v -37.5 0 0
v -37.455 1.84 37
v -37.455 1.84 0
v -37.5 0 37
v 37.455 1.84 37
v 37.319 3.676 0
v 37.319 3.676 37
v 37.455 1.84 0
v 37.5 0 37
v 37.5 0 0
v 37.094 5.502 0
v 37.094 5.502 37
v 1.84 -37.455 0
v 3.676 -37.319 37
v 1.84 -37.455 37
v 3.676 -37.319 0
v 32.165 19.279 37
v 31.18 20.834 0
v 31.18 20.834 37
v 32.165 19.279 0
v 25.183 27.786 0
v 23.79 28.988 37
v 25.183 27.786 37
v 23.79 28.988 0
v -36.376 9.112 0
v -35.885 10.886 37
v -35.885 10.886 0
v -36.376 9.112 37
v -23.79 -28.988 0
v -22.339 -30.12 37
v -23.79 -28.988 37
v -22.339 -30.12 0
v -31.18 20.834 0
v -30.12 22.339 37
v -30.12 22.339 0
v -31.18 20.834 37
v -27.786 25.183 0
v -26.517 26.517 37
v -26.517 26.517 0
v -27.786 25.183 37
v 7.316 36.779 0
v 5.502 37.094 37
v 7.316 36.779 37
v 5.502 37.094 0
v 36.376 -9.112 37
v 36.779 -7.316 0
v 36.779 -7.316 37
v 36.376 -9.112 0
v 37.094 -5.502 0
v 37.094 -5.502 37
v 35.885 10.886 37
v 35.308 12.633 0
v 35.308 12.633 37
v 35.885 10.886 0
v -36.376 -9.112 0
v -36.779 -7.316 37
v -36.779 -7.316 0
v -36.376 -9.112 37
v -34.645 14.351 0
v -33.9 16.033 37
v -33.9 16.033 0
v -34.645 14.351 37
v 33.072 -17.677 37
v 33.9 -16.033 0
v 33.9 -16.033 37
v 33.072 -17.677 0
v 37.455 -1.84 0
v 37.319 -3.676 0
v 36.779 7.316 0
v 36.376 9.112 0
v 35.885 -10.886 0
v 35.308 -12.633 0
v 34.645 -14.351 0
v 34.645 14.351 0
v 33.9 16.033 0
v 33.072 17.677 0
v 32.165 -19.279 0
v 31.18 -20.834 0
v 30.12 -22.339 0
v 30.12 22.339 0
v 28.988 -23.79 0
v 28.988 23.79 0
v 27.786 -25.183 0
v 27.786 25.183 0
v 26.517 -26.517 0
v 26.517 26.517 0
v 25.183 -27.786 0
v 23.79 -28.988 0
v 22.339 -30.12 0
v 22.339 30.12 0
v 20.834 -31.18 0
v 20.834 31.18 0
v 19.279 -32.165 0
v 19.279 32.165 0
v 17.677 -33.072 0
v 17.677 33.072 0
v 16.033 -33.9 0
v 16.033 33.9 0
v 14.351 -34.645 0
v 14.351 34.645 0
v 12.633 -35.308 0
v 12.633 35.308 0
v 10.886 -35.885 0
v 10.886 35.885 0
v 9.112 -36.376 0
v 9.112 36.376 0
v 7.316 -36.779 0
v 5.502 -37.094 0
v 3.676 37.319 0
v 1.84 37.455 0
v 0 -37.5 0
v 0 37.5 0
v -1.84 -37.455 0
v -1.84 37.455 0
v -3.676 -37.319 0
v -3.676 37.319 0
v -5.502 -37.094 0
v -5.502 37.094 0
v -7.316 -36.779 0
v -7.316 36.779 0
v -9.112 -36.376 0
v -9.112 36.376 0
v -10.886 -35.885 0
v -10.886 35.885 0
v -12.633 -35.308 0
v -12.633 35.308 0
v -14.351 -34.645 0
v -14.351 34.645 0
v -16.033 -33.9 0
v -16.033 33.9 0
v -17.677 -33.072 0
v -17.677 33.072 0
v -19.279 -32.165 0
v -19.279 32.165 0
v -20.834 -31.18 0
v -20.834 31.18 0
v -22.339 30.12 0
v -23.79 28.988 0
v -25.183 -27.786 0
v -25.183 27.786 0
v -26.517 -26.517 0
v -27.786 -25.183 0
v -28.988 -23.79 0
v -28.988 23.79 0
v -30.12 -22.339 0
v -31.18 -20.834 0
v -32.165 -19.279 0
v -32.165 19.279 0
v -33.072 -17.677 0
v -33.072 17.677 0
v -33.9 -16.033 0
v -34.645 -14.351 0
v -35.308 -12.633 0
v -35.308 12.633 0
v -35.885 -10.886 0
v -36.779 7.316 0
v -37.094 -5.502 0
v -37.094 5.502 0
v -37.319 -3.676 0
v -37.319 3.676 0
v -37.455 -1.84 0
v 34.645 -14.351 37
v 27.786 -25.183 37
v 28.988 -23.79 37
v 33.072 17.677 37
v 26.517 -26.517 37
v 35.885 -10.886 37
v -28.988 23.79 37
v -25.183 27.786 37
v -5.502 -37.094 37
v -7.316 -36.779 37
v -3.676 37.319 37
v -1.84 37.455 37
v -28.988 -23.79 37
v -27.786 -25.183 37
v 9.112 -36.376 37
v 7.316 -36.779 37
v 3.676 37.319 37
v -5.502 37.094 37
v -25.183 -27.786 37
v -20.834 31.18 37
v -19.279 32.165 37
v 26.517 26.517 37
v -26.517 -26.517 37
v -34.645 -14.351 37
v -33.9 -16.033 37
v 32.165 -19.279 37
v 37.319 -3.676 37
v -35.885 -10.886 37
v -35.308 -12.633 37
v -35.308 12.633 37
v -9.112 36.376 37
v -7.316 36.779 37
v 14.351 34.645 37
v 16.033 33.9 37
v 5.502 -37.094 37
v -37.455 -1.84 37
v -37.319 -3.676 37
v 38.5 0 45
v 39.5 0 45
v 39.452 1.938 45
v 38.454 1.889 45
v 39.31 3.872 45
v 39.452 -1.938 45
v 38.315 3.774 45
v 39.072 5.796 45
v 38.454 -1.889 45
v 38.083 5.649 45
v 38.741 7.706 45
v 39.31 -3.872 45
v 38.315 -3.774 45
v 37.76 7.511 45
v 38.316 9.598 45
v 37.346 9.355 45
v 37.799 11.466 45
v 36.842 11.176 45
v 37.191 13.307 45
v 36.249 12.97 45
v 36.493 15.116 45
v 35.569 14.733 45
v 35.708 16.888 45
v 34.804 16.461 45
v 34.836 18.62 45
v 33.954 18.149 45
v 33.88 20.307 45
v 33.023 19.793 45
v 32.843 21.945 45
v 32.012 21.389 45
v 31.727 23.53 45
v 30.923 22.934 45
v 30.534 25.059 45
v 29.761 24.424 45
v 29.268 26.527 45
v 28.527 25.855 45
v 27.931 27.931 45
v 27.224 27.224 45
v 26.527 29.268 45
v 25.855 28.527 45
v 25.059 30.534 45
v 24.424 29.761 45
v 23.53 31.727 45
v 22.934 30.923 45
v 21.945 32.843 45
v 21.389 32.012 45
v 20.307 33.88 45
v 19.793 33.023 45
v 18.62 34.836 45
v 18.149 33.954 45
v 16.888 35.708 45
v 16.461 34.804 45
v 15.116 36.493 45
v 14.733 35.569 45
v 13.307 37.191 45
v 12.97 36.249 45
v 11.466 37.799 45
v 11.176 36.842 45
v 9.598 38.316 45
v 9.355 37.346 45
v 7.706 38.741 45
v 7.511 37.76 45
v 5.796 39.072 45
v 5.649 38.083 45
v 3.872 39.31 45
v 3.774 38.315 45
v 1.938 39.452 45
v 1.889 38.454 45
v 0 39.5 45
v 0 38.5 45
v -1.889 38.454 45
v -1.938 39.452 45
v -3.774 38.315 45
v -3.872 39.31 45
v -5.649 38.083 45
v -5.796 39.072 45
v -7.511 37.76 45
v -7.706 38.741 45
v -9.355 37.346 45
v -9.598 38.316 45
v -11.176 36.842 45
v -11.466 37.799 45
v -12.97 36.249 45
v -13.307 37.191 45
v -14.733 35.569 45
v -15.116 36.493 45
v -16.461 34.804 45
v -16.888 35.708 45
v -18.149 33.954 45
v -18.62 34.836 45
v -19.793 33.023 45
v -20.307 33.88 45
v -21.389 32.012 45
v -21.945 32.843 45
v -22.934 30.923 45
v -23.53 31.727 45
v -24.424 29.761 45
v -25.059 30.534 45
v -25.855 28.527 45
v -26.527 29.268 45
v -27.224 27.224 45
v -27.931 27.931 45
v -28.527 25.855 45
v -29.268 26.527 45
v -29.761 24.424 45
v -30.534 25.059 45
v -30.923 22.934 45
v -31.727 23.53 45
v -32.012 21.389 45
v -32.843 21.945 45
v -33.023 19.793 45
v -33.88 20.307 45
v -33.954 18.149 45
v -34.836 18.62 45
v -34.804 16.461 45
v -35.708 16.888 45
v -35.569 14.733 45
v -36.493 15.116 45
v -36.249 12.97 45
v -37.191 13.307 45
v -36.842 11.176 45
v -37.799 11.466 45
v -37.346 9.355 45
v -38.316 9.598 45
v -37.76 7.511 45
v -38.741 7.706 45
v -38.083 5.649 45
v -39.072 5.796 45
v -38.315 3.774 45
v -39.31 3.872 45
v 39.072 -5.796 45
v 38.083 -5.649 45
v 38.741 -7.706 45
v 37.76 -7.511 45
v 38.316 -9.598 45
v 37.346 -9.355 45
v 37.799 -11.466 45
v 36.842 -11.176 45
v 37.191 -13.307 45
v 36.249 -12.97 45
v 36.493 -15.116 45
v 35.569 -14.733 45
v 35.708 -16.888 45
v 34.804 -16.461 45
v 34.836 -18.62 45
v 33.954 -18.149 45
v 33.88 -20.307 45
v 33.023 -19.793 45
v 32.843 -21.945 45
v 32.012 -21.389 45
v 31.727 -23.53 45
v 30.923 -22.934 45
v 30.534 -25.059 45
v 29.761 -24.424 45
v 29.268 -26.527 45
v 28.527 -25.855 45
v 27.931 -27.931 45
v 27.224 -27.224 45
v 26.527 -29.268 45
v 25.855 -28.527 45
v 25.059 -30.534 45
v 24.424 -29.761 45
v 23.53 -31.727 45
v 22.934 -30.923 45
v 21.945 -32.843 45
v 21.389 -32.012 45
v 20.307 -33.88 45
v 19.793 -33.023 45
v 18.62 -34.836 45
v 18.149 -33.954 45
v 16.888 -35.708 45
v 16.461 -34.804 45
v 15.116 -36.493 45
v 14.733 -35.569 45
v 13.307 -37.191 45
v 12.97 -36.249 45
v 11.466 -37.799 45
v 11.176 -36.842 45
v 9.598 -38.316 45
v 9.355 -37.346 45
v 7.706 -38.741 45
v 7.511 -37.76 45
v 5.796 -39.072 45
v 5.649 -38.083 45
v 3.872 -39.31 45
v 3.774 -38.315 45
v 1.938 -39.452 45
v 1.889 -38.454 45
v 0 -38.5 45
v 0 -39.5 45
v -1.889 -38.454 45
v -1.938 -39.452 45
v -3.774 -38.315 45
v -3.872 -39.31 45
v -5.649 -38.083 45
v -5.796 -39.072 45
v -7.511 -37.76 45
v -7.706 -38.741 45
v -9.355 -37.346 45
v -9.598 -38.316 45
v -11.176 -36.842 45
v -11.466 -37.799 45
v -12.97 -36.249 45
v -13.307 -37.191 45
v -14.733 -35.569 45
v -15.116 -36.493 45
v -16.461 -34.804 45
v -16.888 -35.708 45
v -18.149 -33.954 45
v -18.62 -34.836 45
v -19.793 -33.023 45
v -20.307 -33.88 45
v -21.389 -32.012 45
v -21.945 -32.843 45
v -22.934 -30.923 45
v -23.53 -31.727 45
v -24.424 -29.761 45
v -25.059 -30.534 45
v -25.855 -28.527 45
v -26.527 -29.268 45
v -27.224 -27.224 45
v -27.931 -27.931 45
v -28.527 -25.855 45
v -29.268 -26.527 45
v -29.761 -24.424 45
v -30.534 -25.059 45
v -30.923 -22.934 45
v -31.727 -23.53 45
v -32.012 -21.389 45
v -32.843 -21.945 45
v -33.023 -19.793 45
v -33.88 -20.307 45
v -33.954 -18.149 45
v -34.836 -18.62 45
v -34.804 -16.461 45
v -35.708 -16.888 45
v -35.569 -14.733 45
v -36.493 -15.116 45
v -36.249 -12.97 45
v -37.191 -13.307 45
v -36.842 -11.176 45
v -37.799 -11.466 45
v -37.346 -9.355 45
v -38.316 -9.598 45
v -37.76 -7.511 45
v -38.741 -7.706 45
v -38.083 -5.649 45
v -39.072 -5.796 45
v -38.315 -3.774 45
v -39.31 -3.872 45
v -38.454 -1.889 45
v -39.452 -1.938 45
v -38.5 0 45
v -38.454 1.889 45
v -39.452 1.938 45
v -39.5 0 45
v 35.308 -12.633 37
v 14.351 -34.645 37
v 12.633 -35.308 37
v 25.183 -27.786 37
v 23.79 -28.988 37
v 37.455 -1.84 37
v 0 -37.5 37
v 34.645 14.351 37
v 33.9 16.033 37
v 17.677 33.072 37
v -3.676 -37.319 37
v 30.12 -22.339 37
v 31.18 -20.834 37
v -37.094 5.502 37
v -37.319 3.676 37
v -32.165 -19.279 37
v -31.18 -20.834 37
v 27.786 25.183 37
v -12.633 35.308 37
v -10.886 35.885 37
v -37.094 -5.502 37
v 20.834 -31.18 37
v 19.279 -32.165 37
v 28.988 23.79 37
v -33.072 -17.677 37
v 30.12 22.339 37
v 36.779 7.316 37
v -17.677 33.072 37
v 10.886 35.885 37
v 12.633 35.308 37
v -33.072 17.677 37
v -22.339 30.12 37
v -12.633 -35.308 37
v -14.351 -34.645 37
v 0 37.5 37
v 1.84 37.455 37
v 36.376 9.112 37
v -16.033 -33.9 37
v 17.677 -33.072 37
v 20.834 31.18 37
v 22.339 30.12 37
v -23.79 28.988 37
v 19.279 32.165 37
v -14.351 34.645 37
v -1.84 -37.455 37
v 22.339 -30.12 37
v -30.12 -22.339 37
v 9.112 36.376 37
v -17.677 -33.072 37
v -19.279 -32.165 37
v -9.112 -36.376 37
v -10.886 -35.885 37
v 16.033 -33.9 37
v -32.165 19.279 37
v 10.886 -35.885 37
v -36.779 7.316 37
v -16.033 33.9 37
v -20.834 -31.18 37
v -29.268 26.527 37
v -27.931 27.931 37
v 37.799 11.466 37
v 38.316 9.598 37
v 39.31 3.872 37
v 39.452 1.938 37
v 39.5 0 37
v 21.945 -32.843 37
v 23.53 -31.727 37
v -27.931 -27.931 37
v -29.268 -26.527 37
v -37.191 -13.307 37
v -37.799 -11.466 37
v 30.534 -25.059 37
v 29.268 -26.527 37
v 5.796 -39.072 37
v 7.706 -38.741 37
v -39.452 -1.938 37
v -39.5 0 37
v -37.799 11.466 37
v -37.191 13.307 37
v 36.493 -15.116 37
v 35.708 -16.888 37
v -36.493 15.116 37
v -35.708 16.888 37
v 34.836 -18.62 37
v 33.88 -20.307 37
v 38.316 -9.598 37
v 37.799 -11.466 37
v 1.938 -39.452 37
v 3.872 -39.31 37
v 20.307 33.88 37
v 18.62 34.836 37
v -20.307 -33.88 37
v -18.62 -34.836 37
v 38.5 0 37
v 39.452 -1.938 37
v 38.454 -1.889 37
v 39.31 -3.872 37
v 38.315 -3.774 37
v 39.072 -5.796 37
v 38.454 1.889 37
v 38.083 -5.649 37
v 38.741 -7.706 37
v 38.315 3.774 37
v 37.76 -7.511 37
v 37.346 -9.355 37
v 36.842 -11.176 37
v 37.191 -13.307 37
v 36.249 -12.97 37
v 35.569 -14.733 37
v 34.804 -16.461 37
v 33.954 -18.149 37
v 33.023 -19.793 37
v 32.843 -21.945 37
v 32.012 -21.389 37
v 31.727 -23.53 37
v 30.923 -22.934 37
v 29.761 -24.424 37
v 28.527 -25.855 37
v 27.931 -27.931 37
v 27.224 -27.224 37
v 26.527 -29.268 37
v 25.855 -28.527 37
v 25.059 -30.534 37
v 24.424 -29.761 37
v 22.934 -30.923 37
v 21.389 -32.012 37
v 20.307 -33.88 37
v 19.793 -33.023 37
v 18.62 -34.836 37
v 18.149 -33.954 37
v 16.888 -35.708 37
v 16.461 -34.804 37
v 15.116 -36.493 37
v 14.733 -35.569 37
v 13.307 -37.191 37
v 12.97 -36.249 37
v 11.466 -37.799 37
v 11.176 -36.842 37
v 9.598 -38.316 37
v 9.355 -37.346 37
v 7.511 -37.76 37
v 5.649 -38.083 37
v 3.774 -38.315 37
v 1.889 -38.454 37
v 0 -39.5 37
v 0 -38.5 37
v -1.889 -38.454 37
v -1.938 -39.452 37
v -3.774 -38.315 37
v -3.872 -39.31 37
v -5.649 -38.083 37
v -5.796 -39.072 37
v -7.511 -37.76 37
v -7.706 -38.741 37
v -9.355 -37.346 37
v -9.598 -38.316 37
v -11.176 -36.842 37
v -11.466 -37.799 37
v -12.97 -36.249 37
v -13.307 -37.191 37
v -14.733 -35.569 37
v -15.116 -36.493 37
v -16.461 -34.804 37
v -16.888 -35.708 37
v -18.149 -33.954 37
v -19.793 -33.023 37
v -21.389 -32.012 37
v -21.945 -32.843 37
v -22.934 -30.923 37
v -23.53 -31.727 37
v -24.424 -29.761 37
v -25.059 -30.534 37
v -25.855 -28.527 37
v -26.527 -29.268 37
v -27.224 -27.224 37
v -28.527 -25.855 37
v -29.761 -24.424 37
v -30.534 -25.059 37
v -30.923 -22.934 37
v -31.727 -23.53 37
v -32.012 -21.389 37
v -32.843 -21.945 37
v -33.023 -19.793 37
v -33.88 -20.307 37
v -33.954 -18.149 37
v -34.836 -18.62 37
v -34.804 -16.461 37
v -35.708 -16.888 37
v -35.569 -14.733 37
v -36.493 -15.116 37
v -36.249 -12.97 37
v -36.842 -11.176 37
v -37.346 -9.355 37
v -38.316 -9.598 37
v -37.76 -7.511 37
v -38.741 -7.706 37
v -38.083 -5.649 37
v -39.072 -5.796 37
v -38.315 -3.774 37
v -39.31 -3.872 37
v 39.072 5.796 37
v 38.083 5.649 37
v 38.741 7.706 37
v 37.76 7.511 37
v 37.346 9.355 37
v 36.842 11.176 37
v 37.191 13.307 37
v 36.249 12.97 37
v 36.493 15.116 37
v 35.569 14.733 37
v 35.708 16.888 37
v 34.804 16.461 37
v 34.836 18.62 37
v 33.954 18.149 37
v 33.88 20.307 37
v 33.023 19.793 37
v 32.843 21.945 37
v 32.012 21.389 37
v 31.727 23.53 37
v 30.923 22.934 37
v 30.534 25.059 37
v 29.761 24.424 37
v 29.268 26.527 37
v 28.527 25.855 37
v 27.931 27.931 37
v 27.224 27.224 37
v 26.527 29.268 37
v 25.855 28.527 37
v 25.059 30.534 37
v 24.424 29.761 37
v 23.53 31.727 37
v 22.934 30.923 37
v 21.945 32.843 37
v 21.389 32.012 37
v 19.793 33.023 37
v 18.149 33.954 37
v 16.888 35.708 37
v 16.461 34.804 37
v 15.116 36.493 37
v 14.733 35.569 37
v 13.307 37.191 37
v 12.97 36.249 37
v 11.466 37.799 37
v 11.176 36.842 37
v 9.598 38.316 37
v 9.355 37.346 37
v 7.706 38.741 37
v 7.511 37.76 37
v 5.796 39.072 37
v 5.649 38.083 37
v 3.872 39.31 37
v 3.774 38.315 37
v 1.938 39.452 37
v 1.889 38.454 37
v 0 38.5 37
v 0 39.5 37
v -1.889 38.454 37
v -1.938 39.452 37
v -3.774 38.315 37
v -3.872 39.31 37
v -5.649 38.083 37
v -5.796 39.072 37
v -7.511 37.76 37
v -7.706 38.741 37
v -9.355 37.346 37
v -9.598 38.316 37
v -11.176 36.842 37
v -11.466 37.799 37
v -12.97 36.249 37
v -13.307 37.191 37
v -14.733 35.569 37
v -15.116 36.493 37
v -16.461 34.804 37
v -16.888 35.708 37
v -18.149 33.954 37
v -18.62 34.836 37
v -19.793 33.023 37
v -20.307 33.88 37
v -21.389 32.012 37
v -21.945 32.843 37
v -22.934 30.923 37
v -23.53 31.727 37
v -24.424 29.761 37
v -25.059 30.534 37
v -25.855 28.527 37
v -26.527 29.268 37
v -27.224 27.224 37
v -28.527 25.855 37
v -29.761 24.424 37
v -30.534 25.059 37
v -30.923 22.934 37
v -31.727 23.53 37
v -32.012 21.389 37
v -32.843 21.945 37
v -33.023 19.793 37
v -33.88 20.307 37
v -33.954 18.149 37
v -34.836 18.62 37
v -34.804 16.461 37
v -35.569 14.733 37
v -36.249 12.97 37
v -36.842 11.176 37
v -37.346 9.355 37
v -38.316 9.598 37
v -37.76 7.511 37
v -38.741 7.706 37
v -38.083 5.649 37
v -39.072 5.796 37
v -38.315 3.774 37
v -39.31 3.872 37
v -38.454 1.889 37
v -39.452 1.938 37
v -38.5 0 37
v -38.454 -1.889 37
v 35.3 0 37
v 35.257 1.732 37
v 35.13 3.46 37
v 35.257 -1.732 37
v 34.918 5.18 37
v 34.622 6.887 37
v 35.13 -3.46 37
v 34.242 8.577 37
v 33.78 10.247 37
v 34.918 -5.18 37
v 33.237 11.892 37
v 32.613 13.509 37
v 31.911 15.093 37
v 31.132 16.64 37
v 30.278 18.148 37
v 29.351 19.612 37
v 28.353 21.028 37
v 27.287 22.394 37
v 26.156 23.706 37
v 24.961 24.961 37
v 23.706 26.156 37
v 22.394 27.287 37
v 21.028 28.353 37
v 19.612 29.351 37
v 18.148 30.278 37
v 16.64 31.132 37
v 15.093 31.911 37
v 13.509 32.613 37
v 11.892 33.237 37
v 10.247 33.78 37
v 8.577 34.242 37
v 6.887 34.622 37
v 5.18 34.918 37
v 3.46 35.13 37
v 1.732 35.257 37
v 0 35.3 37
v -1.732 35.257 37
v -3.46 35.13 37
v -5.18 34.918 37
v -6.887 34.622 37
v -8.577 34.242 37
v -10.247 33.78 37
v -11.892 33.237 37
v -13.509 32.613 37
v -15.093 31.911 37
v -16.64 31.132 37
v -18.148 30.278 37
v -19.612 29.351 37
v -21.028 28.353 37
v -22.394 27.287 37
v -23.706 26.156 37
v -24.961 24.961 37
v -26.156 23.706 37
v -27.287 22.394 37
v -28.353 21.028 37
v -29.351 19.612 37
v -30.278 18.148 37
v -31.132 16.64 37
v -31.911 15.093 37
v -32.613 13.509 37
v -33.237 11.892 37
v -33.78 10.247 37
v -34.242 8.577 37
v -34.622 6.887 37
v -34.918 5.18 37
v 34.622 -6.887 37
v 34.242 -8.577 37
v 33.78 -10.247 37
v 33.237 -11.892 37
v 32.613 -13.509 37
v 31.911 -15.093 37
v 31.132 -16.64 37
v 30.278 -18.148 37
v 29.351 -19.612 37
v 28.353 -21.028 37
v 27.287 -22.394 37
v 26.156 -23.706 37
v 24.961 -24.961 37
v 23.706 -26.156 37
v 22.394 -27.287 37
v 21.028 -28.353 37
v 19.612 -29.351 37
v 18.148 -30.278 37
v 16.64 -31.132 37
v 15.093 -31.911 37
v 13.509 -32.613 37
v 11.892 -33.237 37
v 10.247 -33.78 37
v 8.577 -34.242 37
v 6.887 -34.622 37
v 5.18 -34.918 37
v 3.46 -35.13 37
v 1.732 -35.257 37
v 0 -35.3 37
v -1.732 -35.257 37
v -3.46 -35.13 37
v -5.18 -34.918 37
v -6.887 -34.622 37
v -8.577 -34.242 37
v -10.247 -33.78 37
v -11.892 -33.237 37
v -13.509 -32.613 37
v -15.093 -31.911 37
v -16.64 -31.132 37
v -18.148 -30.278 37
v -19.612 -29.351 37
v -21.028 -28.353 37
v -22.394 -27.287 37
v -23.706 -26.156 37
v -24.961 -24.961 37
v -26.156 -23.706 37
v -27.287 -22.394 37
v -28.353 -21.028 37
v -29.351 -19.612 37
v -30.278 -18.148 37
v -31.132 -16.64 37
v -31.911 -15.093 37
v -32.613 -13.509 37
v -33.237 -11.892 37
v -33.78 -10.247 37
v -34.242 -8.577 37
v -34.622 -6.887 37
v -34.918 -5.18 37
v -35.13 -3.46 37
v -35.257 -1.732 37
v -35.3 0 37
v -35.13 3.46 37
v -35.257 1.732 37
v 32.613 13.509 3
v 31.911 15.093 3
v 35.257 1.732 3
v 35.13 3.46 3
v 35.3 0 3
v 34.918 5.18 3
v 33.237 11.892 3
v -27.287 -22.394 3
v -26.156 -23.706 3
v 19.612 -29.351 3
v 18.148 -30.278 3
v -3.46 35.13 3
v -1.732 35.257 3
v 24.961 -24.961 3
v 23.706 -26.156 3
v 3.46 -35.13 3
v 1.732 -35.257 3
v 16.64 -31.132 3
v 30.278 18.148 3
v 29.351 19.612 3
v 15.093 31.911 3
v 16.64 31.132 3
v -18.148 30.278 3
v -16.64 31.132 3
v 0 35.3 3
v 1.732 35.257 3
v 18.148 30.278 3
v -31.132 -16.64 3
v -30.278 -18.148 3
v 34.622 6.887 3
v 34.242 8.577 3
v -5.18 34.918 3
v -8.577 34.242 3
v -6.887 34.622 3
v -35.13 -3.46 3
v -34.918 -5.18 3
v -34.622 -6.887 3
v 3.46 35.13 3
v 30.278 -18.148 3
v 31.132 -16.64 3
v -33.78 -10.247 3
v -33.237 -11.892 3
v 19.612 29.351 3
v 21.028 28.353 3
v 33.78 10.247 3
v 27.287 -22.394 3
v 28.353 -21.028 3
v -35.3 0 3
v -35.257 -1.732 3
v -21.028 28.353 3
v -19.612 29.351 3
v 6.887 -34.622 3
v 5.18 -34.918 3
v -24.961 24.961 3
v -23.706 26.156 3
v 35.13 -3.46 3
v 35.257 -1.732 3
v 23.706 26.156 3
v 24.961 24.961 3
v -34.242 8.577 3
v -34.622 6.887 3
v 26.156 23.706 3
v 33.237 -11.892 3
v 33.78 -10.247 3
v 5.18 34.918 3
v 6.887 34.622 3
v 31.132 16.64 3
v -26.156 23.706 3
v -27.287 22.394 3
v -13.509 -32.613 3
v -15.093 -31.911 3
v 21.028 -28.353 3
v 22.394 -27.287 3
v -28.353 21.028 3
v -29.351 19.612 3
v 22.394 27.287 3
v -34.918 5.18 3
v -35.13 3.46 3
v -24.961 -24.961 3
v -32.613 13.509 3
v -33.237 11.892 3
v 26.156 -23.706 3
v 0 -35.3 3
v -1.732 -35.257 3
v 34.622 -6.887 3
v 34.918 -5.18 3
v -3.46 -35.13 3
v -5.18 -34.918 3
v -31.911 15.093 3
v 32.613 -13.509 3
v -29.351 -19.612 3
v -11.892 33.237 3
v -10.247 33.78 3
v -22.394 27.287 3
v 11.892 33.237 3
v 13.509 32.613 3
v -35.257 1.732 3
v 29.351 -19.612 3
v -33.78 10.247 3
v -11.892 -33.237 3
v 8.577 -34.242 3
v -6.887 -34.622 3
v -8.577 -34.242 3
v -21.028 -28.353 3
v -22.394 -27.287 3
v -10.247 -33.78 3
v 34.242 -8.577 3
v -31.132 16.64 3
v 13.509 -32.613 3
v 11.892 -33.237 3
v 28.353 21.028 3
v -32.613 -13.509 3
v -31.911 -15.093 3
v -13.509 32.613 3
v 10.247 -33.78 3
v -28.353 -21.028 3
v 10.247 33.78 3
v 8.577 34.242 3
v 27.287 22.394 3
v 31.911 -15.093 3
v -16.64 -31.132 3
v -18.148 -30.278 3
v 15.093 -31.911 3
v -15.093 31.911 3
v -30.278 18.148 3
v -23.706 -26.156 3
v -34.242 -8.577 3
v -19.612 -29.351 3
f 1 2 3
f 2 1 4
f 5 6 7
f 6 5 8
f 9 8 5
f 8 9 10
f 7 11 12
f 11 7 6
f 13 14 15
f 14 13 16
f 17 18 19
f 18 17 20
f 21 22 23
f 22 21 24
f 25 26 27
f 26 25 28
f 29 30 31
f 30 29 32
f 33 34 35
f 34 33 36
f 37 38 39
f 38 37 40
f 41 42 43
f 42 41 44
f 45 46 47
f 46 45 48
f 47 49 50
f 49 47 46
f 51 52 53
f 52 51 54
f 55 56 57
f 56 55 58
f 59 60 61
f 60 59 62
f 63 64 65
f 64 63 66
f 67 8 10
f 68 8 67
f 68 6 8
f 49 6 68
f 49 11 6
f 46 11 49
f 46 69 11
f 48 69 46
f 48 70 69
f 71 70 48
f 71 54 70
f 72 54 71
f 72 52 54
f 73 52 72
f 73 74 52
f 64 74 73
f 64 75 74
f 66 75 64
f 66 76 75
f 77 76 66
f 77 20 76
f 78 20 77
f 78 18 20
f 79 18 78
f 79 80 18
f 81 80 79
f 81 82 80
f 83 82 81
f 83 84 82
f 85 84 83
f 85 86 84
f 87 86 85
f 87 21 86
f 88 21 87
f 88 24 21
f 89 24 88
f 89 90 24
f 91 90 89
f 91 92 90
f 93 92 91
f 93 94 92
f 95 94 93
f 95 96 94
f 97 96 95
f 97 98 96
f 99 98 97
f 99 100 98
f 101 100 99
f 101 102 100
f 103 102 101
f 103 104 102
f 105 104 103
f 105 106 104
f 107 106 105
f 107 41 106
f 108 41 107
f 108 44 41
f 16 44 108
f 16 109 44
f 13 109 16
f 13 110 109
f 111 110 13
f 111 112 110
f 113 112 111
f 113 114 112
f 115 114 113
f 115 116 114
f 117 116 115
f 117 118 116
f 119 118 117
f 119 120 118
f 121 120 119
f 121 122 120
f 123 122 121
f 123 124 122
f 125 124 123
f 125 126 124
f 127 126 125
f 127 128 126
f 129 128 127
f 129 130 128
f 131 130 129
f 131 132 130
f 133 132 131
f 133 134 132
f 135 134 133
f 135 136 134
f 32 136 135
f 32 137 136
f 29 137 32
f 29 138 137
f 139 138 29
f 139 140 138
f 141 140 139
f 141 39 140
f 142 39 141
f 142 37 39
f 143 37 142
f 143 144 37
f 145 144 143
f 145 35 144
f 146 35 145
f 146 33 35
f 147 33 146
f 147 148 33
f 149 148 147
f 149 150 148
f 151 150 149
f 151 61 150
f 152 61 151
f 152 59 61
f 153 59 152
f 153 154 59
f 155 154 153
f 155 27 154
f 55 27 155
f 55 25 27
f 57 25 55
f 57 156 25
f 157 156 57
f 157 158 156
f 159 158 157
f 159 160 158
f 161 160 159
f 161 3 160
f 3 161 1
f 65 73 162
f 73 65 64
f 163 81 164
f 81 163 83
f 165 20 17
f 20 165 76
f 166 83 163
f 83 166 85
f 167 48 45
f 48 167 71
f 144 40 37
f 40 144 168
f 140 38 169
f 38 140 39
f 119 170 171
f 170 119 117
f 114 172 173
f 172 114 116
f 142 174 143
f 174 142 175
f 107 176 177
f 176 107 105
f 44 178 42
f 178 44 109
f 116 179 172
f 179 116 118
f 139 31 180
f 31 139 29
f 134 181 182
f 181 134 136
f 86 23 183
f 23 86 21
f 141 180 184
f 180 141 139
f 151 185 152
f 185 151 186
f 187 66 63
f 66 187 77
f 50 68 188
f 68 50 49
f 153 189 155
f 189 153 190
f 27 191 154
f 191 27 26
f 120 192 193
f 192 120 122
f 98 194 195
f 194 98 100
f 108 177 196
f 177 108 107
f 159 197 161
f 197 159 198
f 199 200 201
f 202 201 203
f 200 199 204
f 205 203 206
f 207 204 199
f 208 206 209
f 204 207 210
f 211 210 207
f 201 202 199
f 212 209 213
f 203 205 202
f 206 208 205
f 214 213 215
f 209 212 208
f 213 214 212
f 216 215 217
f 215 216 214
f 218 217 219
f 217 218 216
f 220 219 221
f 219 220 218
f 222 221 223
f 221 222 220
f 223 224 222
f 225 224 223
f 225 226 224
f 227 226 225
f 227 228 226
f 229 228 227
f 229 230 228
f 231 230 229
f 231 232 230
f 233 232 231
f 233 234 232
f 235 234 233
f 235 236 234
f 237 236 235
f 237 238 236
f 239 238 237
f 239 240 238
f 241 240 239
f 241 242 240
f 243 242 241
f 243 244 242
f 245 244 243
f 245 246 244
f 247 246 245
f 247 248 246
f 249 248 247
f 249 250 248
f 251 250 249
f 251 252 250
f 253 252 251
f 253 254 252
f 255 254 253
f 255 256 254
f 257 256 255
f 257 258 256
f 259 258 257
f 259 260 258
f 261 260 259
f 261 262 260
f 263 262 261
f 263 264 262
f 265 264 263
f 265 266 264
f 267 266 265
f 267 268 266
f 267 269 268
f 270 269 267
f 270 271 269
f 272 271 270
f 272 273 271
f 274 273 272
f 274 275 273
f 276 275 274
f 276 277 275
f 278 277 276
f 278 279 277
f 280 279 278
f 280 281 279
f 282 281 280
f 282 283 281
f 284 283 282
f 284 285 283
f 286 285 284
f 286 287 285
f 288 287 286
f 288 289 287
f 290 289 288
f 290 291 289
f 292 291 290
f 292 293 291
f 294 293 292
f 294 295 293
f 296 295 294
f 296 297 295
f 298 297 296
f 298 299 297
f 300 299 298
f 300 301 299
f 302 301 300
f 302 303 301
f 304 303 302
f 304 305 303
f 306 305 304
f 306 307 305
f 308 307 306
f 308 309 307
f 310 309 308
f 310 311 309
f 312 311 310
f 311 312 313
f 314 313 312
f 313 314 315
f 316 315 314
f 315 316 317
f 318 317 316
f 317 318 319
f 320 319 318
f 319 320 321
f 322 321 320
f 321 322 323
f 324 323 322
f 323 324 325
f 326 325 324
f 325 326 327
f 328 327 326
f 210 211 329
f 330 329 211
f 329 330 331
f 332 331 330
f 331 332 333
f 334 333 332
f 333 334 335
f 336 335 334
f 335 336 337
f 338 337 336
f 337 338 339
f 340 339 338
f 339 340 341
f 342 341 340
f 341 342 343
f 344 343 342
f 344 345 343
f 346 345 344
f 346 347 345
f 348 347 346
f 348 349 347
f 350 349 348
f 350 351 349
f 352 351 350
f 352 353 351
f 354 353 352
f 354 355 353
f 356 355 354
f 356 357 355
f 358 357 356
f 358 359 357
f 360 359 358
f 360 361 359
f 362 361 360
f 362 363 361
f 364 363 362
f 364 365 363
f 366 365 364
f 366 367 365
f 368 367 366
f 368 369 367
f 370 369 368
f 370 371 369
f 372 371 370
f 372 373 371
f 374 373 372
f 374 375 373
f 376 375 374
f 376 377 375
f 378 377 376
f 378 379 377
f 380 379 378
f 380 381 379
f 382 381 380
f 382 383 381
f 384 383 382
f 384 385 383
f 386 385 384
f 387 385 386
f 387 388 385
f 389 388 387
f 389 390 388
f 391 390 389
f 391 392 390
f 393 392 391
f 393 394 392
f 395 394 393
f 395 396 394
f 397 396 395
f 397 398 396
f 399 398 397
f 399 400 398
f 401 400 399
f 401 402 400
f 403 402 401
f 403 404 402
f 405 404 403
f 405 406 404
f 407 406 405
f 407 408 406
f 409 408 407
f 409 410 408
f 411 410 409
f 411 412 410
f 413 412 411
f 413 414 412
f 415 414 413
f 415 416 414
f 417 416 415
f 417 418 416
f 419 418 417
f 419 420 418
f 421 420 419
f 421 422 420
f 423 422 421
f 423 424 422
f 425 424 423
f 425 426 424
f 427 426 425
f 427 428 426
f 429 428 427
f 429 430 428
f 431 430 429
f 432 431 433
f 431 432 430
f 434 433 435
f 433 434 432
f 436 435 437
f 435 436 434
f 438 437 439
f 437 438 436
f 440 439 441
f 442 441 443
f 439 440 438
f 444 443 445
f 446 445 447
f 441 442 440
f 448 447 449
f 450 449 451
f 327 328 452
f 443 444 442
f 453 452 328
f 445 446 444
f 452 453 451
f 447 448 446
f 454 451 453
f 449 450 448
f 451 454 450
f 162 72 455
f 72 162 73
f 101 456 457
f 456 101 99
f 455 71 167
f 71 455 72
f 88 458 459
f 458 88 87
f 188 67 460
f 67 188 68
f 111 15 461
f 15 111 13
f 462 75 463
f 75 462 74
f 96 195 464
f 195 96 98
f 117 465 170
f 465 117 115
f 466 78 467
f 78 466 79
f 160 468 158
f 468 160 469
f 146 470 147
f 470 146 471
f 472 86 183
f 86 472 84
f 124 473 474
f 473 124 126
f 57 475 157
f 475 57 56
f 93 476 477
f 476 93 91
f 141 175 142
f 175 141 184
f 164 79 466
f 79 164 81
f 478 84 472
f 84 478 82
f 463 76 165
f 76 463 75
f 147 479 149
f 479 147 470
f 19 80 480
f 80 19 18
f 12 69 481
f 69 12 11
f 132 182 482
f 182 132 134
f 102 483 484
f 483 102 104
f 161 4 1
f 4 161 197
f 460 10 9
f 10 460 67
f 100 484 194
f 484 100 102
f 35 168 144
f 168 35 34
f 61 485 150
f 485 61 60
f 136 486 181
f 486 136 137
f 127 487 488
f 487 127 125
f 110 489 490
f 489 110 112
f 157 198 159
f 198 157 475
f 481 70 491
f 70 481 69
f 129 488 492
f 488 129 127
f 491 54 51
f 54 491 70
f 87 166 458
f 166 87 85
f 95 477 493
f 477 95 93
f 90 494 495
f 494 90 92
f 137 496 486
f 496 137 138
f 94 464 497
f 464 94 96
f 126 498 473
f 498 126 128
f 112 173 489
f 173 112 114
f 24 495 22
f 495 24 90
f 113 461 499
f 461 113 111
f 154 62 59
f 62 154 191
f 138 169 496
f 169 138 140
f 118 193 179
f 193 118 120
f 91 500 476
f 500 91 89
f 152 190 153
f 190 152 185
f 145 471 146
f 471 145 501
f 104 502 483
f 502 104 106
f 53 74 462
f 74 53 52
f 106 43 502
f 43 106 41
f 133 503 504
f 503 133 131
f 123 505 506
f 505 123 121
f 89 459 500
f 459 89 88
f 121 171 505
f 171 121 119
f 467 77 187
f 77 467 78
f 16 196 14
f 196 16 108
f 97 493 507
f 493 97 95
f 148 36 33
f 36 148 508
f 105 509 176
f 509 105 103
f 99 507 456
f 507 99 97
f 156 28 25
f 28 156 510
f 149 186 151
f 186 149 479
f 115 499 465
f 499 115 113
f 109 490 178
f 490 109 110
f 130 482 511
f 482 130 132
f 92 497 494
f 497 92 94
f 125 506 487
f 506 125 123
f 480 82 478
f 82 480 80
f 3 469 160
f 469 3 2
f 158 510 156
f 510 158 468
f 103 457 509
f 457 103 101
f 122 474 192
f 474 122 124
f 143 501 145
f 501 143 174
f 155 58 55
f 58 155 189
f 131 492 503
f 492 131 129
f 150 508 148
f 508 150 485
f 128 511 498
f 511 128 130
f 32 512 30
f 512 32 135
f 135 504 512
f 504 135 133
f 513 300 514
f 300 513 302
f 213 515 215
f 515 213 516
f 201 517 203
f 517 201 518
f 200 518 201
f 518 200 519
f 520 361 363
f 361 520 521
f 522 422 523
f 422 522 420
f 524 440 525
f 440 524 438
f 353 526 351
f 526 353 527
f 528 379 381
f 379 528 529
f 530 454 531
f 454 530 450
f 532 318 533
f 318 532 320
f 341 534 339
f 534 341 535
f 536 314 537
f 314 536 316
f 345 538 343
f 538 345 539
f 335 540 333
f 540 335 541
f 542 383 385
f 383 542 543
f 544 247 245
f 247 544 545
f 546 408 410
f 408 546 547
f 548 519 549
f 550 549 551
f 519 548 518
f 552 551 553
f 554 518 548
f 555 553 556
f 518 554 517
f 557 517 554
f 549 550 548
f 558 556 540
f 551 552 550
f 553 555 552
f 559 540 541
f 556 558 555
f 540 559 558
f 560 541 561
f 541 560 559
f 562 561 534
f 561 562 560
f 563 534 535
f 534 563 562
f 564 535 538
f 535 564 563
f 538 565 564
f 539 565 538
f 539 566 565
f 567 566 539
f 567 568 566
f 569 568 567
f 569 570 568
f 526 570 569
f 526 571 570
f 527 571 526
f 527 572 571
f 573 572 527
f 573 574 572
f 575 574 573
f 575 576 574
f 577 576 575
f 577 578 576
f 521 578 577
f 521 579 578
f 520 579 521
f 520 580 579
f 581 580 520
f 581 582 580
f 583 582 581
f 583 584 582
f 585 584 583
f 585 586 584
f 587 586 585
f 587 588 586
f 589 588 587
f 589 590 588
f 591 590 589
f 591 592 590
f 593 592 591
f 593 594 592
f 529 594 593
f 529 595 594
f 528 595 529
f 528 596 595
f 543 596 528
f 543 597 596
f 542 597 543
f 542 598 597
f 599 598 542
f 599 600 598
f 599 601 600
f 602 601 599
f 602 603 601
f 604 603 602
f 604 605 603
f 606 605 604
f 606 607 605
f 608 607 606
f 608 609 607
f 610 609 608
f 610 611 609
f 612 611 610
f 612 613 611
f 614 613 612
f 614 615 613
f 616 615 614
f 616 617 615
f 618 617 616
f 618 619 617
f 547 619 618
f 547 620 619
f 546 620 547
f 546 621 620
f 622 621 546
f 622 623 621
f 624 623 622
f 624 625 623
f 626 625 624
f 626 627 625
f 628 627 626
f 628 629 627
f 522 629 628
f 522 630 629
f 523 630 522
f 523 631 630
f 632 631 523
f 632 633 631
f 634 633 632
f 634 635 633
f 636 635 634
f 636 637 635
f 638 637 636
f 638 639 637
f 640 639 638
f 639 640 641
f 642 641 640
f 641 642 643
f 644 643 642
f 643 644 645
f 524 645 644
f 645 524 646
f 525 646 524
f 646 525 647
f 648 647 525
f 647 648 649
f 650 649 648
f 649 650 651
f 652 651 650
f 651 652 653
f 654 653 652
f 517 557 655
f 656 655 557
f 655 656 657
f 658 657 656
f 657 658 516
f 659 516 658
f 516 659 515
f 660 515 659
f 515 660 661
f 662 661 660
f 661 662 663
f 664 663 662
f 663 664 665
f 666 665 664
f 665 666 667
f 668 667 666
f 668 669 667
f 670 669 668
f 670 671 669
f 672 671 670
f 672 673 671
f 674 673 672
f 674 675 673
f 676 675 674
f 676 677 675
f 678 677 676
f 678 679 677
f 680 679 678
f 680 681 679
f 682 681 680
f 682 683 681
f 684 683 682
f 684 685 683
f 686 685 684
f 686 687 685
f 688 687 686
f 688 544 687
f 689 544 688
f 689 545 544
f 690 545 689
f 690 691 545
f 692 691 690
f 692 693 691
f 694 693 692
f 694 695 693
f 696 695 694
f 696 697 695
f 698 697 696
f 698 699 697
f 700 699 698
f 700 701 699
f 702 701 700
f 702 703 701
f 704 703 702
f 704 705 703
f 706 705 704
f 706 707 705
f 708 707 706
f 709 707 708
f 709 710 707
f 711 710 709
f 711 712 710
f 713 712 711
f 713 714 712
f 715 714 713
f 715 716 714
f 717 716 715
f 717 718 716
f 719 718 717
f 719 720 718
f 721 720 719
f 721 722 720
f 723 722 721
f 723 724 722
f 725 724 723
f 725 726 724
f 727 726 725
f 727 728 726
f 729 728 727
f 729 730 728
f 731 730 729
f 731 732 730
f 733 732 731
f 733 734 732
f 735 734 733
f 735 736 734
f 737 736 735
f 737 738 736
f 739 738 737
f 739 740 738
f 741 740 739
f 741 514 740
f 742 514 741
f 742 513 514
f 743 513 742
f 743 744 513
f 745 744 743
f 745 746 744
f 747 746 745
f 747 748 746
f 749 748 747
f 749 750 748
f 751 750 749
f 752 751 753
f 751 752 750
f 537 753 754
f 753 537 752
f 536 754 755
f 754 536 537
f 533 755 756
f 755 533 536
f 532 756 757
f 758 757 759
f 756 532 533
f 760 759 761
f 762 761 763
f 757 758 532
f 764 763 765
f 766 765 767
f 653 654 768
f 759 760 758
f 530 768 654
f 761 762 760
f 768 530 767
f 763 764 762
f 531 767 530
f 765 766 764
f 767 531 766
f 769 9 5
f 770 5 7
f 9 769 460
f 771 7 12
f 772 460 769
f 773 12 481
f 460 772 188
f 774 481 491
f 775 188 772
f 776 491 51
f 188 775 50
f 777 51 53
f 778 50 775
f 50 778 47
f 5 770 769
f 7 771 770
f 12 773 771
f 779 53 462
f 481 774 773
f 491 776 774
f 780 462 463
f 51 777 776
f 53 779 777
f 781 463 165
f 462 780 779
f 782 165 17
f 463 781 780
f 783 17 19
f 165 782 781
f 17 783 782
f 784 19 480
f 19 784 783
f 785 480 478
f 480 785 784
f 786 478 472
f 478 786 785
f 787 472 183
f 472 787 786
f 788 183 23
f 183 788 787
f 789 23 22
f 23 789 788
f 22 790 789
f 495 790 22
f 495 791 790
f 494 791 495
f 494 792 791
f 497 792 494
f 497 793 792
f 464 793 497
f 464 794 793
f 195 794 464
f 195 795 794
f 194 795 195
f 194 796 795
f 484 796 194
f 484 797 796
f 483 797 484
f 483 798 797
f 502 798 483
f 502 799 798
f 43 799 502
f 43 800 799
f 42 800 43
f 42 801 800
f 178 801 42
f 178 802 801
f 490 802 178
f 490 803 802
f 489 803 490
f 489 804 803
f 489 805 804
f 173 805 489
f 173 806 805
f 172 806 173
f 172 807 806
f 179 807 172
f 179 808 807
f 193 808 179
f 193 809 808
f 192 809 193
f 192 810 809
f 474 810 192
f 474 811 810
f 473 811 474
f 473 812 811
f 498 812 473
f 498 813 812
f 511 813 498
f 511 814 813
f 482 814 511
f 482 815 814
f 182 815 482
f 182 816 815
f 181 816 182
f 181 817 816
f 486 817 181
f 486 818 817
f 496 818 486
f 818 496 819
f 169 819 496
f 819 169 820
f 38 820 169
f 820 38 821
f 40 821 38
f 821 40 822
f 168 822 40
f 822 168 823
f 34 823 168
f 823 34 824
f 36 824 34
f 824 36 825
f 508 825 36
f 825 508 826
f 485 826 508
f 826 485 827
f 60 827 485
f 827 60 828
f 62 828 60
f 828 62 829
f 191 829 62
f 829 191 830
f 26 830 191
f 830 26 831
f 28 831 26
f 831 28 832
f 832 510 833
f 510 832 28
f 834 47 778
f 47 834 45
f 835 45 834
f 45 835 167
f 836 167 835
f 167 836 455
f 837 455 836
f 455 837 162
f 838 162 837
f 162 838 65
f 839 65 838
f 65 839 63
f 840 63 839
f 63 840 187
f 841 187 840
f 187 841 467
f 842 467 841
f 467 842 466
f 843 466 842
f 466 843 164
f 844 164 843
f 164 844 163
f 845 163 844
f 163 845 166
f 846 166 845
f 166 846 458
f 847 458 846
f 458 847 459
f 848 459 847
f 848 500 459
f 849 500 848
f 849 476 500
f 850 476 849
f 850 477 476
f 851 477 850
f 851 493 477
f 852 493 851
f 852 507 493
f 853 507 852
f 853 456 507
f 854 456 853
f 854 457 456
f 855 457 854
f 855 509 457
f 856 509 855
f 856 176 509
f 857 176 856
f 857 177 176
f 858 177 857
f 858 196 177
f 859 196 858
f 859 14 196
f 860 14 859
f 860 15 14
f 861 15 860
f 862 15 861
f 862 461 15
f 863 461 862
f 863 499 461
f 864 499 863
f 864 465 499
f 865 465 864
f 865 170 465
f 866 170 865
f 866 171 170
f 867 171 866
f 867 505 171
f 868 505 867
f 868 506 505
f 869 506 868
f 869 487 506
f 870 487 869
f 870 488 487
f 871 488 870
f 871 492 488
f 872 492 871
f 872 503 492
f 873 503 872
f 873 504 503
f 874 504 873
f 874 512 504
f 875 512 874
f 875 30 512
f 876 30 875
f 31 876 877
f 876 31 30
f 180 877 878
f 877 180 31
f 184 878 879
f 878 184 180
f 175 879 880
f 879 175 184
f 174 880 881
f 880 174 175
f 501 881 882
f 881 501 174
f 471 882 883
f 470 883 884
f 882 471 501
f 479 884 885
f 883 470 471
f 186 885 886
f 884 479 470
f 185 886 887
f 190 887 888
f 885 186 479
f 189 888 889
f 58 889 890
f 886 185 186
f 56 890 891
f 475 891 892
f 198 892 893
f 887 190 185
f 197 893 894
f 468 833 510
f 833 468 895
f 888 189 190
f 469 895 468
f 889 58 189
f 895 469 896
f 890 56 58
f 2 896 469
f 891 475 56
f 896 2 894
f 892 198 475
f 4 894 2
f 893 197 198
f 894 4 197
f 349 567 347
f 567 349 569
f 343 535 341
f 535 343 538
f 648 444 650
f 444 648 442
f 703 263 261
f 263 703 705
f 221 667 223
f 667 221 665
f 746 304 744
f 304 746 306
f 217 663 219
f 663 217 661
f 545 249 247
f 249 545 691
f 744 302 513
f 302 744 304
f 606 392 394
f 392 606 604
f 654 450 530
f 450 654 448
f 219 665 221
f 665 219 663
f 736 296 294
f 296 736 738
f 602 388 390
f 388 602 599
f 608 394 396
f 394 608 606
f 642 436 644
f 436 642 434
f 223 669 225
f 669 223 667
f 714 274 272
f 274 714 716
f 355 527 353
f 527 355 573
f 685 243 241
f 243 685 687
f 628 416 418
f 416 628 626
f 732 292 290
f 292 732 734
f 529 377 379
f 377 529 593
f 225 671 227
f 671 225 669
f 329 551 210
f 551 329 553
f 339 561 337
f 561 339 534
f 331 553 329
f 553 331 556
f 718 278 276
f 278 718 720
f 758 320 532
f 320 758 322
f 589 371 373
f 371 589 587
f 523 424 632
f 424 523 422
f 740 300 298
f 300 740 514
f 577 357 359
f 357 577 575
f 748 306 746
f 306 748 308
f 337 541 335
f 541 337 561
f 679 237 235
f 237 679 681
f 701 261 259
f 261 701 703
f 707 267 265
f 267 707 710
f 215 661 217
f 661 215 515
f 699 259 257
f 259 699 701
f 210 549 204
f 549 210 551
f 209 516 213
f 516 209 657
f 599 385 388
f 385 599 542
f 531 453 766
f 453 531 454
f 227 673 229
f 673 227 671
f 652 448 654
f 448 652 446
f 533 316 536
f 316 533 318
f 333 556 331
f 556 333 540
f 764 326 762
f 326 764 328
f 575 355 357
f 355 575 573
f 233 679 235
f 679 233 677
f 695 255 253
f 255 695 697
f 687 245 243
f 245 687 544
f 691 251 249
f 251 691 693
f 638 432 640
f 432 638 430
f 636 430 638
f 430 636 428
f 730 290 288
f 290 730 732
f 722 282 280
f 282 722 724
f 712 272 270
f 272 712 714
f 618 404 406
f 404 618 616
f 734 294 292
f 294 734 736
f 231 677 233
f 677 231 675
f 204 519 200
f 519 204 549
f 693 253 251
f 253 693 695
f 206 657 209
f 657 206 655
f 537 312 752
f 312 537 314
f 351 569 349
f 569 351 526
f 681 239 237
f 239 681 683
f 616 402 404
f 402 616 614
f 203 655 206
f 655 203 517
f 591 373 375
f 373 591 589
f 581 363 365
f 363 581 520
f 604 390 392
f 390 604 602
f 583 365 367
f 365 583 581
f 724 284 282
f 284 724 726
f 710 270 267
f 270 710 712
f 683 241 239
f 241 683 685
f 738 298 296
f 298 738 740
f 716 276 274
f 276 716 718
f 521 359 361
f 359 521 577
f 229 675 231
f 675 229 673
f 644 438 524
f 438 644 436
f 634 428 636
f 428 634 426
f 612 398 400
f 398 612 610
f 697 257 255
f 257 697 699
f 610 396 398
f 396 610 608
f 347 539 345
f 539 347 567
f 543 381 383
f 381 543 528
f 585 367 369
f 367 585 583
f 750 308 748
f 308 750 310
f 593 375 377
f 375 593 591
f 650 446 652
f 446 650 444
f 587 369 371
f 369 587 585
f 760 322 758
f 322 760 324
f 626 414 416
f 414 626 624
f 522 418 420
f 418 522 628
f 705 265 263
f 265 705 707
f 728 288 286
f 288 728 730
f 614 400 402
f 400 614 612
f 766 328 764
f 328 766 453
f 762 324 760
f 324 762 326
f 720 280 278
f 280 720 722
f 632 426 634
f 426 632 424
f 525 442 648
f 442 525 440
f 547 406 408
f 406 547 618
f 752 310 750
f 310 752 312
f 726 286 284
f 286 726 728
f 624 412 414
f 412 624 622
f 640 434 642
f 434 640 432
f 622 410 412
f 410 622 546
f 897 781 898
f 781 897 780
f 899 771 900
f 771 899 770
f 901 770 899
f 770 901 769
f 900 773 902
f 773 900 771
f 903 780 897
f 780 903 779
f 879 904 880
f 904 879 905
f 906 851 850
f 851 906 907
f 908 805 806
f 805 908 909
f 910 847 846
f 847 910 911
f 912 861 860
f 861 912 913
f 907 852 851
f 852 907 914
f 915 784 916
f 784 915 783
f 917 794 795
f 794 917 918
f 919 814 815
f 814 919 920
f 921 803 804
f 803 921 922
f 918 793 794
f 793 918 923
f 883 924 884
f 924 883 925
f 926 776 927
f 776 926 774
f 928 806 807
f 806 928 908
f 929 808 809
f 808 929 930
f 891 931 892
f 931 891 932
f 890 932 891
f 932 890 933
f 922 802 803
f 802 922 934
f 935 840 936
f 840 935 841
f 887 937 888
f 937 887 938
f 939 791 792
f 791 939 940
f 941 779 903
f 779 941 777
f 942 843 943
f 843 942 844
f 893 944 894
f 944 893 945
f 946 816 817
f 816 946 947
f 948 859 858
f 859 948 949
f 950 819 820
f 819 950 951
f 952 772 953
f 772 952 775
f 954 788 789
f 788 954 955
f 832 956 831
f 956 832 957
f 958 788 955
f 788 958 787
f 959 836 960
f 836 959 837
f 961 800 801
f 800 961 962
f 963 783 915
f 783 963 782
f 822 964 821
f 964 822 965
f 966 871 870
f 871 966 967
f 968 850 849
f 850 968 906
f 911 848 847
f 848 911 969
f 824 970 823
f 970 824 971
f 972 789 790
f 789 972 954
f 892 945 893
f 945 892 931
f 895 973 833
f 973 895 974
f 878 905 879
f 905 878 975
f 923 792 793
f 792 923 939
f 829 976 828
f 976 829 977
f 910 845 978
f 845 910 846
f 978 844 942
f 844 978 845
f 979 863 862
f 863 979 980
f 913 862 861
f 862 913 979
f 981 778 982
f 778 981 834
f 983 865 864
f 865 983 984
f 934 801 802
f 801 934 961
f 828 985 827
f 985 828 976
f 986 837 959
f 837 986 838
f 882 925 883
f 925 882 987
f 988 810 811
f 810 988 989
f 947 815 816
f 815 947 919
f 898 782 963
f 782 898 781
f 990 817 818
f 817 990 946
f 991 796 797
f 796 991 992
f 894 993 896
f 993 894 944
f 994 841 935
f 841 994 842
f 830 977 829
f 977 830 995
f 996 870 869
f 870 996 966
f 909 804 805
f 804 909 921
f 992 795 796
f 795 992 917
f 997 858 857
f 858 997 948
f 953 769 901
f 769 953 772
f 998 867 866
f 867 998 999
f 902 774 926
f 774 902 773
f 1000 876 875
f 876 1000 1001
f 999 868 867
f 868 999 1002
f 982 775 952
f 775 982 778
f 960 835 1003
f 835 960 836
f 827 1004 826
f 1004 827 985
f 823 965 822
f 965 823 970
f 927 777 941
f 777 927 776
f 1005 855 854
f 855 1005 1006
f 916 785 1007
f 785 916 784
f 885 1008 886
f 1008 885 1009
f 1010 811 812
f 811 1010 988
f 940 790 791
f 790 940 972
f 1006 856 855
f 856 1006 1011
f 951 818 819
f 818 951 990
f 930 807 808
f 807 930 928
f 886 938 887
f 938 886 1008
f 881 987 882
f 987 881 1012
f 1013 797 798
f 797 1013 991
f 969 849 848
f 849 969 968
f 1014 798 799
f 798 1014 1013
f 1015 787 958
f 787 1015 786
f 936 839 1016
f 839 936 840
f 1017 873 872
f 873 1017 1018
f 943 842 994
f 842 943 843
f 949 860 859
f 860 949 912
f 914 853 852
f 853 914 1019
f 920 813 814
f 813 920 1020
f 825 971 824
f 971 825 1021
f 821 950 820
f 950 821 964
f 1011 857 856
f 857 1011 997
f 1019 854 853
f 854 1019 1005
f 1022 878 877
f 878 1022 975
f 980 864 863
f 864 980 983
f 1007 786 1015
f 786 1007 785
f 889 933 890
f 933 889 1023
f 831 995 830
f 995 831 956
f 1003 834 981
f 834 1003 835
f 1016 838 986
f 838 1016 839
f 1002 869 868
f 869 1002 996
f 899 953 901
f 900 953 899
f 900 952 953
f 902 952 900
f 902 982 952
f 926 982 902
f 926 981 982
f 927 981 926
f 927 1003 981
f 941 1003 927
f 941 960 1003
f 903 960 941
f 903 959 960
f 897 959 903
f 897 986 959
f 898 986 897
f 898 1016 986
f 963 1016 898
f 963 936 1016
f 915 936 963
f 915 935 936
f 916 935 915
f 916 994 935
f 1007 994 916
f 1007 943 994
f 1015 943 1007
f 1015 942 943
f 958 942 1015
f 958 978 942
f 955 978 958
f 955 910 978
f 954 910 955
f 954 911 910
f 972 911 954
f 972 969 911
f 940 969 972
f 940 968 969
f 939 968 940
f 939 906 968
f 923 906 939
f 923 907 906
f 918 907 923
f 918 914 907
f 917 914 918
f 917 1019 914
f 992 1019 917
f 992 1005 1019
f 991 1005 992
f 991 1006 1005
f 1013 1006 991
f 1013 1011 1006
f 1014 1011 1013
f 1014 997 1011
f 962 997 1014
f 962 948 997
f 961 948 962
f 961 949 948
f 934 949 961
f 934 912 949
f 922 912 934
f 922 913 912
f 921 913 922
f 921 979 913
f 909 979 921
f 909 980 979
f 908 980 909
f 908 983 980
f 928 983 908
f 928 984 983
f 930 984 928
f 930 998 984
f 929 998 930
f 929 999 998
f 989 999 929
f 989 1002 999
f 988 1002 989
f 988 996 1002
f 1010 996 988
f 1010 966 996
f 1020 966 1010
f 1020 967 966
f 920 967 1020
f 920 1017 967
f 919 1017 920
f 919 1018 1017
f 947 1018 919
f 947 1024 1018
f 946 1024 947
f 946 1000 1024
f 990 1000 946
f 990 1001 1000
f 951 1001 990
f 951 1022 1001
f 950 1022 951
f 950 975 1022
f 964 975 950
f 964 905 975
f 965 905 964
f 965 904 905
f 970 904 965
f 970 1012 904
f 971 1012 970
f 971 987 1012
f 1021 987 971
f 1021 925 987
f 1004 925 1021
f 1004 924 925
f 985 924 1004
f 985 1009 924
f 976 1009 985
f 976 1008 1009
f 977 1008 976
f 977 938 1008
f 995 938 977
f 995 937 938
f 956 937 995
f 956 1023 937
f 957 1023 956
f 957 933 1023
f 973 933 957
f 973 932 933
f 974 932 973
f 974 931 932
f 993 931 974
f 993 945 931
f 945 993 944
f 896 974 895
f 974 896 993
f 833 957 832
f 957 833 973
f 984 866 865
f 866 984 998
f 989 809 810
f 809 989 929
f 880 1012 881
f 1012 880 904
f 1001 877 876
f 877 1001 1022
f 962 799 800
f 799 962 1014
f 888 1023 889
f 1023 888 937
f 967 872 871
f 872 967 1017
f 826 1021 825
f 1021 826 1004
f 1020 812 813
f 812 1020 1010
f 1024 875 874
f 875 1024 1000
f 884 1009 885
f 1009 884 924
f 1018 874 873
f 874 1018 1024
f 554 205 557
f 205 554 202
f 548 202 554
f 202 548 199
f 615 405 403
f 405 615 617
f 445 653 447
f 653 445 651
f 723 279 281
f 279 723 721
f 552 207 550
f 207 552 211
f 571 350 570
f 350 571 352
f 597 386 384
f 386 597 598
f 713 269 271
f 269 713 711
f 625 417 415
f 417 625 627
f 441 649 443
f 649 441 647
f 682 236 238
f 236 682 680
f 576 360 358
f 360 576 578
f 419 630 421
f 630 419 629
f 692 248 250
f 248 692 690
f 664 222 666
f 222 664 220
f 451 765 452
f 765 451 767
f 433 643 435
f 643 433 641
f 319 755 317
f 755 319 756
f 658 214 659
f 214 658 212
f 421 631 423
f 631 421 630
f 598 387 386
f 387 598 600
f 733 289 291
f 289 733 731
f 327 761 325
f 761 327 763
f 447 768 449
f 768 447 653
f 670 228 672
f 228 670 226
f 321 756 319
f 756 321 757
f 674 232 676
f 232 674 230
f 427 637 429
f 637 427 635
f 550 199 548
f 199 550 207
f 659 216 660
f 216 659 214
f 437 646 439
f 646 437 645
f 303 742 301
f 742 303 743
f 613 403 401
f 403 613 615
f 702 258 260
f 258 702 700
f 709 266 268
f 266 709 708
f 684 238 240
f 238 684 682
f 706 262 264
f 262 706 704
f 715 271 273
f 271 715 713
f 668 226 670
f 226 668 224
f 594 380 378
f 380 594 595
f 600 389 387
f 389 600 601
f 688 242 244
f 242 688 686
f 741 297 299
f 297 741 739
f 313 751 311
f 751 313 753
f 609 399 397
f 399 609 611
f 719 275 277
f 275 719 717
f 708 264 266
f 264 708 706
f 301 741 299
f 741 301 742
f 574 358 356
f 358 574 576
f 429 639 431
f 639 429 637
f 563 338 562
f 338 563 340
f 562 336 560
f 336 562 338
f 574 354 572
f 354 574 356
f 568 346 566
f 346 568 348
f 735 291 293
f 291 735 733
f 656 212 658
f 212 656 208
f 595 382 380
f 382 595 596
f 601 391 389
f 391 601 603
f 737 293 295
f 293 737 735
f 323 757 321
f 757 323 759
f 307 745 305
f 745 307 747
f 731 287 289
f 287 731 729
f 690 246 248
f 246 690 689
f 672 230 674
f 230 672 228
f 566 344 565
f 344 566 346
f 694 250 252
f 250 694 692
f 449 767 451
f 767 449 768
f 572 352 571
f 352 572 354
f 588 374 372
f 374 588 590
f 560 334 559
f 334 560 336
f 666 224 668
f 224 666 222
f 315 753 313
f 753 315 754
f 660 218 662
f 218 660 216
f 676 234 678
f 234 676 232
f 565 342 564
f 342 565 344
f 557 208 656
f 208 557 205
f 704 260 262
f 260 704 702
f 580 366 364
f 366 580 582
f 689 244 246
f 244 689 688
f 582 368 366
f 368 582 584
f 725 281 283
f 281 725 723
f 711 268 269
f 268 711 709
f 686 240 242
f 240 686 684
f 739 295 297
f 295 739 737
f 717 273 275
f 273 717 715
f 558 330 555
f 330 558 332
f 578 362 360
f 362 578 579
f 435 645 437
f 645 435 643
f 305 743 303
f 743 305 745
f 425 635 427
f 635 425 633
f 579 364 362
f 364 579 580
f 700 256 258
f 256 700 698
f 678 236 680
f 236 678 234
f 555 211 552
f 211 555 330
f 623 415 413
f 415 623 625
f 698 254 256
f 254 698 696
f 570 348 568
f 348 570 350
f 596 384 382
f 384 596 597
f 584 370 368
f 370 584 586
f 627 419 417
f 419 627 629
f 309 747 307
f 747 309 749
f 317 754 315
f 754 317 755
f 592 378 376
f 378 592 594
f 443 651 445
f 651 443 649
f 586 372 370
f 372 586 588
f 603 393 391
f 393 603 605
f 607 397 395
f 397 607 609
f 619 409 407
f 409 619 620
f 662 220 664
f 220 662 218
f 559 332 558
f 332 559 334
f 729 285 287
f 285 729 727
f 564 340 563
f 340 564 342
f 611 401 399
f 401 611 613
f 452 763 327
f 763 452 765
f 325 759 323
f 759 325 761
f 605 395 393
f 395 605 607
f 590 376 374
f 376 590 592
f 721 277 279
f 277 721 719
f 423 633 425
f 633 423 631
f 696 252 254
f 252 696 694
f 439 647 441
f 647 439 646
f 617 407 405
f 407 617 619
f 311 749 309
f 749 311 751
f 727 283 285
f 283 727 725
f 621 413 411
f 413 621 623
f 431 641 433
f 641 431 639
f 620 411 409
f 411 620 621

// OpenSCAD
$fn = 128;

// HT 75 cap (approximation)
// Dimensions in mm
d_nom = 75;                 // nominal pipe size
d_outer = 75;               // outer diameter of pipe/cap body
wall = 2.2;                 // wall thickness
d_inner = d_outer - 2*wall; // inner diameter
cap_depth = 45;             // overall cap height
closed_end_thk = 3.0;       // thickness of the closed end
lip_height = 8;             // small outer lip height
lip_overhang = 2.0;         // lip radial overhang

// Small chamfers/fillets approximated with cones
outer_chamfer_h = 1.2;
outer_chamfer_r = 0.8;
inner_lead_h = 2.0;
inner_lead_r = 1.0;

module ht75_cap() {
    difference() {
        union() {
            // Main outer body
            cylinder(h = cap_depth, d = d_outer);

            // Outer lip near opening
            translate([0,0,cap_depth - lip_height])
                cylinder(h = lip_height, d = d_outer + 2*lip_overhang);

            // Outer chamfer at opening edge (approx)
            translate([0,0,cap_depth - outer_chamfer_h])
                cylinder(h = outer_chamfer_h, d1 = (d_outer + 2*lip_overhang), d2 = (d_outer + 2*lip_overhang) - 2*outer_chamfer_r);
        }

        // Hollow interior (leave closed end thickness)
        translate([0,0,closed_end_thk])
            cylinder(h = cap_depth - closed_end_thk + 0.01, d = d_inner);

        // Inner lead-in chamfer at opening (approx)
        translate([0,0,cap_depth - inner_lead_h])
            cylinder(h = inner_lead_h + 0.02, d1 = d_inner + 2*inner_lead_r, d2 = d_inner);

        // Slight relief under lip (optional)
        translate([0,0,cap_depth - lip_height])
            cylinder(h = lip_height + 0.02, d = d_outer + 2*lip_overhang - 2.0);
    }
}

ht75_cap();
